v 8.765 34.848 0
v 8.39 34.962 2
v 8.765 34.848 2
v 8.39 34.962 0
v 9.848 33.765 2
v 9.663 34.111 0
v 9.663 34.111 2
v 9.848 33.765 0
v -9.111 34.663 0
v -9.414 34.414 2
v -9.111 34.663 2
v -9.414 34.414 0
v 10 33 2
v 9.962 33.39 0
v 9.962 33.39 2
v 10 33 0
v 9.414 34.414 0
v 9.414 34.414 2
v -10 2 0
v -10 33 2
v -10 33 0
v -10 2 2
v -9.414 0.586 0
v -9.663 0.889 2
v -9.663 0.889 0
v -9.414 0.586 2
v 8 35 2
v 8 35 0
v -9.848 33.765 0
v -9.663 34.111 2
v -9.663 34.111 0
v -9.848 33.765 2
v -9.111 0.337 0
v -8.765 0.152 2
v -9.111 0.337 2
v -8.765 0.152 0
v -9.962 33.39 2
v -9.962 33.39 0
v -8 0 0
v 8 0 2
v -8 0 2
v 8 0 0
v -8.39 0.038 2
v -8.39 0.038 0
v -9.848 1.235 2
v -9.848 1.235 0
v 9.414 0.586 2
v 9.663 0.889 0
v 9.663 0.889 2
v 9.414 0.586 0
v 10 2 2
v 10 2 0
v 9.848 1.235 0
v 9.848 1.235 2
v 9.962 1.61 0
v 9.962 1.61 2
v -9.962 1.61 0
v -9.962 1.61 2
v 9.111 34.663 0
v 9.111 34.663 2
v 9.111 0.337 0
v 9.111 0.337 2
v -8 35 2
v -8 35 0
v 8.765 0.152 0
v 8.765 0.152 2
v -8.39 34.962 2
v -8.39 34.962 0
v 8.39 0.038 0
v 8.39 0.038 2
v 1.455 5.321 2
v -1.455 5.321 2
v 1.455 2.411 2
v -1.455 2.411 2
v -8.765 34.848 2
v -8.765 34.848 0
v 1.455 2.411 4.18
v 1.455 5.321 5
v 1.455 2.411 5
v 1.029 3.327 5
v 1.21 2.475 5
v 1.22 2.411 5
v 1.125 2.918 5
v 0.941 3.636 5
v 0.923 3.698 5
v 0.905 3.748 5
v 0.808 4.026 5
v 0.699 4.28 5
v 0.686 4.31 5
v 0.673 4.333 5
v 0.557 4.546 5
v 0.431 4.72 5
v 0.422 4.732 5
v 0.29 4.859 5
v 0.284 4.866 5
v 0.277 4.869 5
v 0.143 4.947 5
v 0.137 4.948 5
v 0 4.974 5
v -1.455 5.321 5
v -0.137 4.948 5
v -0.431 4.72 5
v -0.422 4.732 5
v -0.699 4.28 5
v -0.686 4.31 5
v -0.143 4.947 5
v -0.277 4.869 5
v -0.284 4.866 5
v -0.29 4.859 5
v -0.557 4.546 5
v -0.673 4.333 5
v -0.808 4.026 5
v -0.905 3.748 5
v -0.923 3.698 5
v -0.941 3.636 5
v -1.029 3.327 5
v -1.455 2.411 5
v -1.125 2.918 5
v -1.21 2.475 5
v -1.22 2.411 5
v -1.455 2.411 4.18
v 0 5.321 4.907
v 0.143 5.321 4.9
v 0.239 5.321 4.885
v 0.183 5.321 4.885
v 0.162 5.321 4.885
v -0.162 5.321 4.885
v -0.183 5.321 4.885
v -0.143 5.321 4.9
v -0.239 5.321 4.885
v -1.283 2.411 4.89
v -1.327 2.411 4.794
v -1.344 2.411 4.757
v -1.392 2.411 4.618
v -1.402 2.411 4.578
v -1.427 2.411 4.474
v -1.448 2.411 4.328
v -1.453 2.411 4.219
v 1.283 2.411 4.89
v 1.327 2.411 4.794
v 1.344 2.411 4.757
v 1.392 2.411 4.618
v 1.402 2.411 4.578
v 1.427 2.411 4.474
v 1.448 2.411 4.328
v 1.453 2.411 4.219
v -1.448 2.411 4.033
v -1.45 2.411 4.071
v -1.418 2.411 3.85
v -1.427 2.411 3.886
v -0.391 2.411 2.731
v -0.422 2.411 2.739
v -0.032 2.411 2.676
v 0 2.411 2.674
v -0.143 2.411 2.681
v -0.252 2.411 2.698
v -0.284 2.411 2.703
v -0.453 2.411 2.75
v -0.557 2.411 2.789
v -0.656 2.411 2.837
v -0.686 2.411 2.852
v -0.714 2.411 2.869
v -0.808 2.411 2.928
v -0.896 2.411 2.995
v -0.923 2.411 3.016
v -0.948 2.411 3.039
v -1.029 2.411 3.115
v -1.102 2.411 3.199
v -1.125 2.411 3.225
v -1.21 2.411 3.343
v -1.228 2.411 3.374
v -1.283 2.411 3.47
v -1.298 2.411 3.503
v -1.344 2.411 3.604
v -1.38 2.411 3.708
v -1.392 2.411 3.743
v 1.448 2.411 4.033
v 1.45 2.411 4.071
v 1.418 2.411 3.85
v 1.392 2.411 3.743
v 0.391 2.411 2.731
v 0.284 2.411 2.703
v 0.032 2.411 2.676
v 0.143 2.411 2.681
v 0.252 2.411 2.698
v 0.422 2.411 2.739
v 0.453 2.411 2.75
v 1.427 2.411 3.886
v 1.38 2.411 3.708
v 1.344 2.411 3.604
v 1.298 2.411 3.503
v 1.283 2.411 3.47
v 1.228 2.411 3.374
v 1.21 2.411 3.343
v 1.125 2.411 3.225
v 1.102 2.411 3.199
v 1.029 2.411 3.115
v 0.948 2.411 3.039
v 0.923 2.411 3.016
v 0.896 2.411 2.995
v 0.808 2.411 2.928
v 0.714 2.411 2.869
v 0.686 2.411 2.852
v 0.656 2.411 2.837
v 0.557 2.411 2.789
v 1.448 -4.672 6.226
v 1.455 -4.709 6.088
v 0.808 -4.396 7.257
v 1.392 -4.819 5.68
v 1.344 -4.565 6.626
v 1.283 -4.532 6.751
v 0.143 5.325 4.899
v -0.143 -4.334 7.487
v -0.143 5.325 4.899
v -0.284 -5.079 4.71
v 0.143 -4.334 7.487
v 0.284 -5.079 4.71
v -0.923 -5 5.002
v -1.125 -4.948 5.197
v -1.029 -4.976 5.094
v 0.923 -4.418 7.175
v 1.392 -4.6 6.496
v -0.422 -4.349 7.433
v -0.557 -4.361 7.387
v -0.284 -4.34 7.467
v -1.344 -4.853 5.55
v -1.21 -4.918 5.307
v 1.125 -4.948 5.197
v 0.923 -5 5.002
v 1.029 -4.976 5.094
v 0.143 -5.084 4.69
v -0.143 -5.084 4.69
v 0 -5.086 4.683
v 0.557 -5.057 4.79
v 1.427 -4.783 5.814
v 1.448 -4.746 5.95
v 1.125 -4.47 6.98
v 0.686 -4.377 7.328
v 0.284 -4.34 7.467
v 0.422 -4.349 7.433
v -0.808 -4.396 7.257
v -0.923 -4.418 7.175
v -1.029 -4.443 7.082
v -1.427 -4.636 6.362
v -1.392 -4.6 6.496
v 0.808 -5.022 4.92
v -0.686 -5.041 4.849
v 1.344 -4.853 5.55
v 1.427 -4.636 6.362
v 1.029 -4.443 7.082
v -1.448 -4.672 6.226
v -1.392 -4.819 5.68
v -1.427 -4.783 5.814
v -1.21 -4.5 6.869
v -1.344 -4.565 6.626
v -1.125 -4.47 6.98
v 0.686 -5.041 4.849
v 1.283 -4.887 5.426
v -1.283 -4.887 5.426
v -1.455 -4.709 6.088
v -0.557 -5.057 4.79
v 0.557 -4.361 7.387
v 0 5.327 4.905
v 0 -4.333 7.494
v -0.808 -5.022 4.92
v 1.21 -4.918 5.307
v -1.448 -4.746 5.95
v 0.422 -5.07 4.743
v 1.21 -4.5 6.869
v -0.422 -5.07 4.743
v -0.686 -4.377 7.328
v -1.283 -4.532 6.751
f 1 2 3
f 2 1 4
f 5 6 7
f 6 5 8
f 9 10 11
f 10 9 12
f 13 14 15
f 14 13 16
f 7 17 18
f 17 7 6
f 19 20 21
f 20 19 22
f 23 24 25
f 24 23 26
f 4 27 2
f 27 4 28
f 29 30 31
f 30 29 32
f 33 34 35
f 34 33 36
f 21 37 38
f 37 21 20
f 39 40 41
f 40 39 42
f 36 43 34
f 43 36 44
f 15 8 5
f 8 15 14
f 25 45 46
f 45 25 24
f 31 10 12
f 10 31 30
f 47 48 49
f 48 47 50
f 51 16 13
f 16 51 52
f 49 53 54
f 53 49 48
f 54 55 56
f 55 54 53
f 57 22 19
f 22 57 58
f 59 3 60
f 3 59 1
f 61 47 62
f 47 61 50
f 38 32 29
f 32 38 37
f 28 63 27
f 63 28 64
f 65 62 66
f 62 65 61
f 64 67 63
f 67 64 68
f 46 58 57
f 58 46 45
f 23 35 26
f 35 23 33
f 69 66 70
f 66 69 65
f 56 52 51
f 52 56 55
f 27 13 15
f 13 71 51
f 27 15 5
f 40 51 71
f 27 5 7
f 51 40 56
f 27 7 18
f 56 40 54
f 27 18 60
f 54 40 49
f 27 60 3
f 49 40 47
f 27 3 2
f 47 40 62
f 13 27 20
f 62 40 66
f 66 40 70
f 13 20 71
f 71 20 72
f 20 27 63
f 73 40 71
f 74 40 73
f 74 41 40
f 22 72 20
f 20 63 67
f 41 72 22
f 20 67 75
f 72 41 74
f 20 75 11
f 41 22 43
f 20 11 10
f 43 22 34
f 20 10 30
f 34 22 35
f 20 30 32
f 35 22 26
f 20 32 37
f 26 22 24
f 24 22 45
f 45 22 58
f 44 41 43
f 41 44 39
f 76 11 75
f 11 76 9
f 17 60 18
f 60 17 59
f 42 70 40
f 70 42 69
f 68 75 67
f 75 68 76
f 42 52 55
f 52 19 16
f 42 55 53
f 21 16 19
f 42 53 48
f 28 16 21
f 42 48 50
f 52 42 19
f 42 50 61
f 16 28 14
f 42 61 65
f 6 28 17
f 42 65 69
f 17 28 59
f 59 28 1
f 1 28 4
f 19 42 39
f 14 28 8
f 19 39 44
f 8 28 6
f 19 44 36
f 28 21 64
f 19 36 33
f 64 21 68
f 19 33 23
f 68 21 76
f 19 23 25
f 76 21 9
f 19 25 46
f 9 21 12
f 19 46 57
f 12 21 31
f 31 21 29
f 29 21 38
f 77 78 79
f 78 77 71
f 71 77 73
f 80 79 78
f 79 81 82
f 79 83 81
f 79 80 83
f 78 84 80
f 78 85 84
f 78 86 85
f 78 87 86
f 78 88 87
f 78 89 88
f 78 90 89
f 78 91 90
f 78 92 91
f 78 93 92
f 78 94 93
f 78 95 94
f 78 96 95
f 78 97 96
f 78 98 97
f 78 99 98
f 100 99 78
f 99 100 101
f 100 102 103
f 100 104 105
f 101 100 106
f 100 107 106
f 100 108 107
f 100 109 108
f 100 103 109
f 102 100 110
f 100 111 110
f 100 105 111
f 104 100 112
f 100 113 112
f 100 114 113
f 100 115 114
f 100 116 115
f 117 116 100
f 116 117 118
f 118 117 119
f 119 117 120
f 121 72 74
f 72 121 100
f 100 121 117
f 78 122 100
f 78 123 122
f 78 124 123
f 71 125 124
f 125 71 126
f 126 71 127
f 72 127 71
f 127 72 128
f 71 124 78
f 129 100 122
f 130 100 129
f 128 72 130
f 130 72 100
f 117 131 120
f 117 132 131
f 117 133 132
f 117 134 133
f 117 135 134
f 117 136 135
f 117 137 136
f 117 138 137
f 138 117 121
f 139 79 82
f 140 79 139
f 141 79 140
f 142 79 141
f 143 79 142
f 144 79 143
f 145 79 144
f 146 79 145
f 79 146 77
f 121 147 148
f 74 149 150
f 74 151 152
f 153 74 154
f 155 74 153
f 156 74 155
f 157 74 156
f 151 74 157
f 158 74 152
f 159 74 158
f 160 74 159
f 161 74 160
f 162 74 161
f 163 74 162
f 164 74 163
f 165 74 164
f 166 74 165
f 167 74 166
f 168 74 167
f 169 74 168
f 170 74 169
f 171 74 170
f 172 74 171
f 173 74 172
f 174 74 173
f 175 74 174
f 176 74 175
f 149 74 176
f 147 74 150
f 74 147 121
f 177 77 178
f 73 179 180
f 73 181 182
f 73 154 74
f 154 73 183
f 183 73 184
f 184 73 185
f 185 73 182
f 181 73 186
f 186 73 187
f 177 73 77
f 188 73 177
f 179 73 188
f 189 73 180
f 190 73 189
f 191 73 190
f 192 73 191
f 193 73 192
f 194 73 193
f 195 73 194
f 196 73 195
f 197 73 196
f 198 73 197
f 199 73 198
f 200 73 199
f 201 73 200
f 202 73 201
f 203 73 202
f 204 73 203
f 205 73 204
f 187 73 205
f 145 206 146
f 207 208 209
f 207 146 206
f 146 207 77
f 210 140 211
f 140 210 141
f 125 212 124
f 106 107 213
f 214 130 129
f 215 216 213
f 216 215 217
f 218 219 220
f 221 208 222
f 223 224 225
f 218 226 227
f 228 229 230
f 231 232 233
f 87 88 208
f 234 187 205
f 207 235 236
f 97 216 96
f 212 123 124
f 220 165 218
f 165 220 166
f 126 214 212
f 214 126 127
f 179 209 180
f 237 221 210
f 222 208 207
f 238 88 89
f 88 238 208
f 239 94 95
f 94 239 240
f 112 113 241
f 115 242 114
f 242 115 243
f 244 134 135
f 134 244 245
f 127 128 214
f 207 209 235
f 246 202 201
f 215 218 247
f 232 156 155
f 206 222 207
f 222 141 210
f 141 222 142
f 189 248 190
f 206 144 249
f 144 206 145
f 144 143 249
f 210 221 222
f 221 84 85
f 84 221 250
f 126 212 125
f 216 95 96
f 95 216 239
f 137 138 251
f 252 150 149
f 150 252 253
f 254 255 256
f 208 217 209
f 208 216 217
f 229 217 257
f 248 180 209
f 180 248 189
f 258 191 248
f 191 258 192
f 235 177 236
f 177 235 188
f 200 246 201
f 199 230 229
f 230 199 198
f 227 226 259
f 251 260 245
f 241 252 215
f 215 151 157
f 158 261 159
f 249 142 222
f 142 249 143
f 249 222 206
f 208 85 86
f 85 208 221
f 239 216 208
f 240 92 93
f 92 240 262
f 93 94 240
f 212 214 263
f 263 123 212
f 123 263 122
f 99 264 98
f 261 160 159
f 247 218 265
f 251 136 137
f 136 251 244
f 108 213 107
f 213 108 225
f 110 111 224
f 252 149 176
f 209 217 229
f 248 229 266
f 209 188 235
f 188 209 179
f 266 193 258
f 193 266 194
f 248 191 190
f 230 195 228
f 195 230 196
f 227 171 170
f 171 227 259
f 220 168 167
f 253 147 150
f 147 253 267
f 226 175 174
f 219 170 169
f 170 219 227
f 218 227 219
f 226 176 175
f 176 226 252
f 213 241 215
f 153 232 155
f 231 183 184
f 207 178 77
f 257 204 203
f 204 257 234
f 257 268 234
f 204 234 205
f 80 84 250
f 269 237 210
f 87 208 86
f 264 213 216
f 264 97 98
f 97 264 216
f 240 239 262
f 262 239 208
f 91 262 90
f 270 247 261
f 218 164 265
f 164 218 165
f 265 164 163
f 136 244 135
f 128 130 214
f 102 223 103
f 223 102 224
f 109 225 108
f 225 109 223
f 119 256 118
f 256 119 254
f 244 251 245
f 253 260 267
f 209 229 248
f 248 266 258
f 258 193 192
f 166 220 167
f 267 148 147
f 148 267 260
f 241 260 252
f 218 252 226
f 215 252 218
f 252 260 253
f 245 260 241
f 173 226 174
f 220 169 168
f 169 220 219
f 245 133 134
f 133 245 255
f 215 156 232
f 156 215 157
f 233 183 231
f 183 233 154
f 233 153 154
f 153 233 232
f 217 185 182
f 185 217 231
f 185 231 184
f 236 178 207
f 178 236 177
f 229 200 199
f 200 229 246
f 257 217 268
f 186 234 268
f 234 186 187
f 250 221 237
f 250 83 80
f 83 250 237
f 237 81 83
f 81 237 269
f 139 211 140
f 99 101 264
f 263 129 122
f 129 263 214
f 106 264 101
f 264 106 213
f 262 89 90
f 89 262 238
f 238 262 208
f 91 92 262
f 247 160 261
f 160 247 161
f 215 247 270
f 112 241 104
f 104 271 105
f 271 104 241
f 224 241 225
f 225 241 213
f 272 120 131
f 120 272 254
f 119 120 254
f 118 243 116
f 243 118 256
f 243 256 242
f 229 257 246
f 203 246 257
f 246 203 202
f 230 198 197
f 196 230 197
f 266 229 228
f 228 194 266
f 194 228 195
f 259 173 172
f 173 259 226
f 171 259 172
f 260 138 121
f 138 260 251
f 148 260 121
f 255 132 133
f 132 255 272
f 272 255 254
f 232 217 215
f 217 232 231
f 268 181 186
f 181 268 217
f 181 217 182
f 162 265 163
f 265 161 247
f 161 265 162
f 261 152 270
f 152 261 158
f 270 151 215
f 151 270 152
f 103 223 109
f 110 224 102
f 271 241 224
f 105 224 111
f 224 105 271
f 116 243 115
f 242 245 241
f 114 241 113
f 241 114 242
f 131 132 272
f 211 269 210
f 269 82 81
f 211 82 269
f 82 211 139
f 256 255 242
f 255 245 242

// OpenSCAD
// ==== Parameters ====
ground_length = 20;         // Length (X)
ground_width = 35;            // Width (Y)
ground_height = 2;           // Height (Z)

support_length = 5;    // Length of the angled support (adjust as needed)
support_angle = 75;     // Angle of the support in degrees
support_height = 5;
support_diameter = 3 * 0.97;   // Should match or be slightly smaller than hole_diameter


// ==== Module: Rounded rectangle using Minkowski (2D only) ====
module rounded_rect_minkowski(length, width, radius) {
    minkowski() {
        square([length - 2*radius, width - 2*radius], center = true);
        circle(r = radius, $fn = 32);
    }
}

// ==== Module for the angled support ====
module angled_support(ground_length, ground_width, ground_height, support_length, support_angle, support_height, support_diameter) {
    union() {
        // Peg that goes into the frame hole
        // ==== Position the rounded object ====
        translate([0, ground_width / 2, ground_height / 2])
            linear_extrude(height = ground_height, center = true)
                rounded_rect_minkowski(ground_length, ground_width, 2);

            //cube([ground_length, ground_width, ground_height], center = true);
        translate([0, - ( cos( support_angle ) / support_diameter ) + support_diameter / 2  + (support_length / 2 ), support_height / 2])
            cube([support_diameter, support_diameter, support_height], center = true);

        // Angled support shaft
        translate([0, support_length*0.99, support_height*0.7])  // Move to the top of the peg
            rotate([support_angle, 0, 0])  // Tilt forward
                cylinder(h = support_length*2, r = support_diameter / 2, $fn = 64, center = false);
    }
}

// ==== Call the support ====
angled_support(ground_length, ground_width, ground_height, 
    support_length, support_angle, support_height, support_diameter);
